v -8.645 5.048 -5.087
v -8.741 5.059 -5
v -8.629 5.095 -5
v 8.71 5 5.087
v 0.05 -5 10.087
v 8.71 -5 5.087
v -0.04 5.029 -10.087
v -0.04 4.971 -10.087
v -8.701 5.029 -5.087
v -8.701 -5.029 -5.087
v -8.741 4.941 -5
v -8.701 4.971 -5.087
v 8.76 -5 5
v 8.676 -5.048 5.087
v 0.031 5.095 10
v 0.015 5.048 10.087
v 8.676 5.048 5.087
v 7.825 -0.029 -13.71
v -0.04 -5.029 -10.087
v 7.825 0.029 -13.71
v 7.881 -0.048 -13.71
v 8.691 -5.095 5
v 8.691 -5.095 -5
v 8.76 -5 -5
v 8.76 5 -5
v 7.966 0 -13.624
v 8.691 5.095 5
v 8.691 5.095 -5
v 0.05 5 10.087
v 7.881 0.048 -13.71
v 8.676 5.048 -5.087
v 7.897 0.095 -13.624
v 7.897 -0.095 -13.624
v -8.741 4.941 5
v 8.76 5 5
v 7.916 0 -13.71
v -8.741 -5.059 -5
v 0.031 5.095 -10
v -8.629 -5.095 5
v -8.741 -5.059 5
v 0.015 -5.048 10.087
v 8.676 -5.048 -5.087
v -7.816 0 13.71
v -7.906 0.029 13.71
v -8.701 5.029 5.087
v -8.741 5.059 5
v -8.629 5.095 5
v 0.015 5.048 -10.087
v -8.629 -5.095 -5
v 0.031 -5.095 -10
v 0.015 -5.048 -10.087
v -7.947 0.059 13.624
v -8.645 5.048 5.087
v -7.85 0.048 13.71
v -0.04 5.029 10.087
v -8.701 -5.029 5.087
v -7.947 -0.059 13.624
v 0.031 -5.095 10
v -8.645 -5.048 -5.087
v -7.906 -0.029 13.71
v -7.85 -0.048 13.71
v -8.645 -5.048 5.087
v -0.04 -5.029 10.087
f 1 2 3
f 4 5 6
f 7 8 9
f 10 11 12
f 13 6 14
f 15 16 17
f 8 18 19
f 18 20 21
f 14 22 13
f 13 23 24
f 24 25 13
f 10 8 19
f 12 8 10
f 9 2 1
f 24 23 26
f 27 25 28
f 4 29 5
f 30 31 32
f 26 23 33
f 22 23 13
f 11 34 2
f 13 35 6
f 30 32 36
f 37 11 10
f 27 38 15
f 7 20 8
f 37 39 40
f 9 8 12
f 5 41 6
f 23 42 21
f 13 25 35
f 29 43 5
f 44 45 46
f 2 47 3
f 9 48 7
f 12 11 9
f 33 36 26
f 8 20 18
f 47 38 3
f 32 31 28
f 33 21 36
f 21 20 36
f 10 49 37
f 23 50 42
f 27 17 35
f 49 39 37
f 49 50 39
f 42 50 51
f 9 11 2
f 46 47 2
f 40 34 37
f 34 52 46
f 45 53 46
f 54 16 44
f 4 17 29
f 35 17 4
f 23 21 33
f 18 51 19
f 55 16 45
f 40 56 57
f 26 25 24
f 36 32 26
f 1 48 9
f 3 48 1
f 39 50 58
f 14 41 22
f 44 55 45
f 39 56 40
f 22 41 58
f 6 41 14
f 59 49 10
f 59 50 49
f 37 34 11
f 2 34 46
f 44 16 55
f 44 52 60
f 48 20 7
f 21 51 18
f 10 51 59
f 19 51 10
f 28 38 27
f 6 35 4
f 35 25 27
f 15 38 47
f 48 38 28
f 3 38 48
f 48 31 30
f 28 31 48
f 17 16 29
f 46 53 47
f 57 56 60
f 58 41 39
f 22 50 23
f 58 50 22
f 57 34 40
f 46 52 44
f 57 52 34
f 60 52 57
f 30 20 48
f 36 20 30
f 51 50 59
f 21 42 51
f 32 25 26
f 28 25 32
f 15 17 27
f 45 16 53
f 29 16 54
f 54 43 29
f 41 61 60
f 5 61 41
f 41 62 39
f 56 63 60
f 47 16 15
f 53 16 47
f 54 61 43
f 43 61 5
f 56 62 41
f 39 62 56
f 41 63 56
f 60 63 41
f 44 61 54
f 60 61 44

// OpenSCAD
// Auto-generated OpenSCAD file

    inner_points = 10*[[0.8660275601949093, -0.49999626496864946, -0.5000000000002527], [0.8660232473576305, 0.5000037350220502, -0.5000000000001439], [2.1564184105024137e-06, -0.49999999999524114, -1.0000000000000544], [-2.156418868470349e-06, 0.4999999999954585, -0.9999999999999456], [2.156418868470349e-06, -0.4999999999954585, 0.9999999999999456], [-2.1564184105024137e-06, 0.49999999999524114, 1.0000000000000544], [-0.8660232473576305, -0.5000037350220502, 0.5000000000001439], [-0.8660275601949093, 0.49999626496864946, 0.5000000000002527], [0.8660275601951383, -0.49999626496875815, 0.49999999999974737], [0.8660232473578595, 0.5000037350219414, 0.4999999999998561], [-0.8660232473578595, -0.5000037350219414, -0.4999999999998561], [-0.8660275601951383, 0.49999626496875815, -0.49999999999974737], [0.7865660924778658, 3.3923317141515653e-06, -1.3623724356959748], [-0.7865660924778658, -3.3923317141515653e-06, 1.3623724356959748]];

    outer_points = 10*[[0.8668436236259911, -0.0019279514490723182, -0.7061008534070546], [0.8660225906704068, -0.707104152868027, 0.002930775546985575], [0.866027055663365, 0.707104152868027, -0.0009251247660098337], [0.8652060227077807, 0.0019279514490723182, 0.7081065041880305], [-0.8652060227077807, -0.0019279514490723182, -0.7081065041880305], [-0.866027055663365, -0.707104152868027, 0.0009251247660098337], [-0.8660225906704068, 0.707104152868027, -0.002930775546985575], [-0.8668436236259911, 0.0019279514490723182, 0.7061008534070546], [0.0012270844404182679, -0.35644400360762196, -1.0596915431180651], [0.0004060514848339595, -1.0616202050265766, -0.3506599141640247], [-0.0004060514848339595, 1.0616202050265766, 0.3506599141640247], [-0.0012270844404182679, 0.35644400360762196, 1.0596915431180651], [1.573131130281187, 0.0, 0.0018216288930887289], [-1.573131130281187, 0.0, -0.0018216288930887289]];

    // Convex hull for inner set (I)
    module inner_hull() {
        hull() {
            for (p = inner_points) {
                translate(p) sphere(r=0.1);
            }
        }
    }

    // Convex hull for outer set (O) minus inner hull (O \ I)
    module outer_minus_inner() {
        difference() {
            hull() {
                for (p = outer_points) {
                    translate(p) sphere(r=0.1);
                }
            }
            inner_hull(); // Subtract inner hull
        }
    }

    // Convex hull for outer set (O) minus all translated inner hulls
    module outer_minus_AllTranslationInner() {
        difference() {
            hull() {
                for (p = outer_points) {
                    translate(p) sphere(r=0.1);
                }
            }
            hull() {
                translate([0,0,50]) inner_hull();
                translate([0,0,-50]) inner_hull();
            }; // Subtract translated inner hulls
        }
    }

    // Difference between outer_minus_inner and outer_minus_AllTranslationInner
    module outer_minus_inner_diff() {
        difference() {
            // Outer minus inner
            difference() {
                hull() {
                    for (p = outer_points) {
                        translate(p) sphere(r=0.1);
                    }
                }
                inner_hull();
            }

            // Subtract Outer minus AllTranslationInner
            difference() {
                hull() {
                    for (p = outer_points) {
                        translate(p) sphere(r=0.1);
                    }
                }
                hull() {
                    translate([0,0,50]) inner_hull();
                    translate([0,0,-50]) inner_hull();
                };
            }
        }
    }

    // Rendering all with colors applied
    color([1, 0, 0, 0.5]) inner_hull(); // Transparent red
    
